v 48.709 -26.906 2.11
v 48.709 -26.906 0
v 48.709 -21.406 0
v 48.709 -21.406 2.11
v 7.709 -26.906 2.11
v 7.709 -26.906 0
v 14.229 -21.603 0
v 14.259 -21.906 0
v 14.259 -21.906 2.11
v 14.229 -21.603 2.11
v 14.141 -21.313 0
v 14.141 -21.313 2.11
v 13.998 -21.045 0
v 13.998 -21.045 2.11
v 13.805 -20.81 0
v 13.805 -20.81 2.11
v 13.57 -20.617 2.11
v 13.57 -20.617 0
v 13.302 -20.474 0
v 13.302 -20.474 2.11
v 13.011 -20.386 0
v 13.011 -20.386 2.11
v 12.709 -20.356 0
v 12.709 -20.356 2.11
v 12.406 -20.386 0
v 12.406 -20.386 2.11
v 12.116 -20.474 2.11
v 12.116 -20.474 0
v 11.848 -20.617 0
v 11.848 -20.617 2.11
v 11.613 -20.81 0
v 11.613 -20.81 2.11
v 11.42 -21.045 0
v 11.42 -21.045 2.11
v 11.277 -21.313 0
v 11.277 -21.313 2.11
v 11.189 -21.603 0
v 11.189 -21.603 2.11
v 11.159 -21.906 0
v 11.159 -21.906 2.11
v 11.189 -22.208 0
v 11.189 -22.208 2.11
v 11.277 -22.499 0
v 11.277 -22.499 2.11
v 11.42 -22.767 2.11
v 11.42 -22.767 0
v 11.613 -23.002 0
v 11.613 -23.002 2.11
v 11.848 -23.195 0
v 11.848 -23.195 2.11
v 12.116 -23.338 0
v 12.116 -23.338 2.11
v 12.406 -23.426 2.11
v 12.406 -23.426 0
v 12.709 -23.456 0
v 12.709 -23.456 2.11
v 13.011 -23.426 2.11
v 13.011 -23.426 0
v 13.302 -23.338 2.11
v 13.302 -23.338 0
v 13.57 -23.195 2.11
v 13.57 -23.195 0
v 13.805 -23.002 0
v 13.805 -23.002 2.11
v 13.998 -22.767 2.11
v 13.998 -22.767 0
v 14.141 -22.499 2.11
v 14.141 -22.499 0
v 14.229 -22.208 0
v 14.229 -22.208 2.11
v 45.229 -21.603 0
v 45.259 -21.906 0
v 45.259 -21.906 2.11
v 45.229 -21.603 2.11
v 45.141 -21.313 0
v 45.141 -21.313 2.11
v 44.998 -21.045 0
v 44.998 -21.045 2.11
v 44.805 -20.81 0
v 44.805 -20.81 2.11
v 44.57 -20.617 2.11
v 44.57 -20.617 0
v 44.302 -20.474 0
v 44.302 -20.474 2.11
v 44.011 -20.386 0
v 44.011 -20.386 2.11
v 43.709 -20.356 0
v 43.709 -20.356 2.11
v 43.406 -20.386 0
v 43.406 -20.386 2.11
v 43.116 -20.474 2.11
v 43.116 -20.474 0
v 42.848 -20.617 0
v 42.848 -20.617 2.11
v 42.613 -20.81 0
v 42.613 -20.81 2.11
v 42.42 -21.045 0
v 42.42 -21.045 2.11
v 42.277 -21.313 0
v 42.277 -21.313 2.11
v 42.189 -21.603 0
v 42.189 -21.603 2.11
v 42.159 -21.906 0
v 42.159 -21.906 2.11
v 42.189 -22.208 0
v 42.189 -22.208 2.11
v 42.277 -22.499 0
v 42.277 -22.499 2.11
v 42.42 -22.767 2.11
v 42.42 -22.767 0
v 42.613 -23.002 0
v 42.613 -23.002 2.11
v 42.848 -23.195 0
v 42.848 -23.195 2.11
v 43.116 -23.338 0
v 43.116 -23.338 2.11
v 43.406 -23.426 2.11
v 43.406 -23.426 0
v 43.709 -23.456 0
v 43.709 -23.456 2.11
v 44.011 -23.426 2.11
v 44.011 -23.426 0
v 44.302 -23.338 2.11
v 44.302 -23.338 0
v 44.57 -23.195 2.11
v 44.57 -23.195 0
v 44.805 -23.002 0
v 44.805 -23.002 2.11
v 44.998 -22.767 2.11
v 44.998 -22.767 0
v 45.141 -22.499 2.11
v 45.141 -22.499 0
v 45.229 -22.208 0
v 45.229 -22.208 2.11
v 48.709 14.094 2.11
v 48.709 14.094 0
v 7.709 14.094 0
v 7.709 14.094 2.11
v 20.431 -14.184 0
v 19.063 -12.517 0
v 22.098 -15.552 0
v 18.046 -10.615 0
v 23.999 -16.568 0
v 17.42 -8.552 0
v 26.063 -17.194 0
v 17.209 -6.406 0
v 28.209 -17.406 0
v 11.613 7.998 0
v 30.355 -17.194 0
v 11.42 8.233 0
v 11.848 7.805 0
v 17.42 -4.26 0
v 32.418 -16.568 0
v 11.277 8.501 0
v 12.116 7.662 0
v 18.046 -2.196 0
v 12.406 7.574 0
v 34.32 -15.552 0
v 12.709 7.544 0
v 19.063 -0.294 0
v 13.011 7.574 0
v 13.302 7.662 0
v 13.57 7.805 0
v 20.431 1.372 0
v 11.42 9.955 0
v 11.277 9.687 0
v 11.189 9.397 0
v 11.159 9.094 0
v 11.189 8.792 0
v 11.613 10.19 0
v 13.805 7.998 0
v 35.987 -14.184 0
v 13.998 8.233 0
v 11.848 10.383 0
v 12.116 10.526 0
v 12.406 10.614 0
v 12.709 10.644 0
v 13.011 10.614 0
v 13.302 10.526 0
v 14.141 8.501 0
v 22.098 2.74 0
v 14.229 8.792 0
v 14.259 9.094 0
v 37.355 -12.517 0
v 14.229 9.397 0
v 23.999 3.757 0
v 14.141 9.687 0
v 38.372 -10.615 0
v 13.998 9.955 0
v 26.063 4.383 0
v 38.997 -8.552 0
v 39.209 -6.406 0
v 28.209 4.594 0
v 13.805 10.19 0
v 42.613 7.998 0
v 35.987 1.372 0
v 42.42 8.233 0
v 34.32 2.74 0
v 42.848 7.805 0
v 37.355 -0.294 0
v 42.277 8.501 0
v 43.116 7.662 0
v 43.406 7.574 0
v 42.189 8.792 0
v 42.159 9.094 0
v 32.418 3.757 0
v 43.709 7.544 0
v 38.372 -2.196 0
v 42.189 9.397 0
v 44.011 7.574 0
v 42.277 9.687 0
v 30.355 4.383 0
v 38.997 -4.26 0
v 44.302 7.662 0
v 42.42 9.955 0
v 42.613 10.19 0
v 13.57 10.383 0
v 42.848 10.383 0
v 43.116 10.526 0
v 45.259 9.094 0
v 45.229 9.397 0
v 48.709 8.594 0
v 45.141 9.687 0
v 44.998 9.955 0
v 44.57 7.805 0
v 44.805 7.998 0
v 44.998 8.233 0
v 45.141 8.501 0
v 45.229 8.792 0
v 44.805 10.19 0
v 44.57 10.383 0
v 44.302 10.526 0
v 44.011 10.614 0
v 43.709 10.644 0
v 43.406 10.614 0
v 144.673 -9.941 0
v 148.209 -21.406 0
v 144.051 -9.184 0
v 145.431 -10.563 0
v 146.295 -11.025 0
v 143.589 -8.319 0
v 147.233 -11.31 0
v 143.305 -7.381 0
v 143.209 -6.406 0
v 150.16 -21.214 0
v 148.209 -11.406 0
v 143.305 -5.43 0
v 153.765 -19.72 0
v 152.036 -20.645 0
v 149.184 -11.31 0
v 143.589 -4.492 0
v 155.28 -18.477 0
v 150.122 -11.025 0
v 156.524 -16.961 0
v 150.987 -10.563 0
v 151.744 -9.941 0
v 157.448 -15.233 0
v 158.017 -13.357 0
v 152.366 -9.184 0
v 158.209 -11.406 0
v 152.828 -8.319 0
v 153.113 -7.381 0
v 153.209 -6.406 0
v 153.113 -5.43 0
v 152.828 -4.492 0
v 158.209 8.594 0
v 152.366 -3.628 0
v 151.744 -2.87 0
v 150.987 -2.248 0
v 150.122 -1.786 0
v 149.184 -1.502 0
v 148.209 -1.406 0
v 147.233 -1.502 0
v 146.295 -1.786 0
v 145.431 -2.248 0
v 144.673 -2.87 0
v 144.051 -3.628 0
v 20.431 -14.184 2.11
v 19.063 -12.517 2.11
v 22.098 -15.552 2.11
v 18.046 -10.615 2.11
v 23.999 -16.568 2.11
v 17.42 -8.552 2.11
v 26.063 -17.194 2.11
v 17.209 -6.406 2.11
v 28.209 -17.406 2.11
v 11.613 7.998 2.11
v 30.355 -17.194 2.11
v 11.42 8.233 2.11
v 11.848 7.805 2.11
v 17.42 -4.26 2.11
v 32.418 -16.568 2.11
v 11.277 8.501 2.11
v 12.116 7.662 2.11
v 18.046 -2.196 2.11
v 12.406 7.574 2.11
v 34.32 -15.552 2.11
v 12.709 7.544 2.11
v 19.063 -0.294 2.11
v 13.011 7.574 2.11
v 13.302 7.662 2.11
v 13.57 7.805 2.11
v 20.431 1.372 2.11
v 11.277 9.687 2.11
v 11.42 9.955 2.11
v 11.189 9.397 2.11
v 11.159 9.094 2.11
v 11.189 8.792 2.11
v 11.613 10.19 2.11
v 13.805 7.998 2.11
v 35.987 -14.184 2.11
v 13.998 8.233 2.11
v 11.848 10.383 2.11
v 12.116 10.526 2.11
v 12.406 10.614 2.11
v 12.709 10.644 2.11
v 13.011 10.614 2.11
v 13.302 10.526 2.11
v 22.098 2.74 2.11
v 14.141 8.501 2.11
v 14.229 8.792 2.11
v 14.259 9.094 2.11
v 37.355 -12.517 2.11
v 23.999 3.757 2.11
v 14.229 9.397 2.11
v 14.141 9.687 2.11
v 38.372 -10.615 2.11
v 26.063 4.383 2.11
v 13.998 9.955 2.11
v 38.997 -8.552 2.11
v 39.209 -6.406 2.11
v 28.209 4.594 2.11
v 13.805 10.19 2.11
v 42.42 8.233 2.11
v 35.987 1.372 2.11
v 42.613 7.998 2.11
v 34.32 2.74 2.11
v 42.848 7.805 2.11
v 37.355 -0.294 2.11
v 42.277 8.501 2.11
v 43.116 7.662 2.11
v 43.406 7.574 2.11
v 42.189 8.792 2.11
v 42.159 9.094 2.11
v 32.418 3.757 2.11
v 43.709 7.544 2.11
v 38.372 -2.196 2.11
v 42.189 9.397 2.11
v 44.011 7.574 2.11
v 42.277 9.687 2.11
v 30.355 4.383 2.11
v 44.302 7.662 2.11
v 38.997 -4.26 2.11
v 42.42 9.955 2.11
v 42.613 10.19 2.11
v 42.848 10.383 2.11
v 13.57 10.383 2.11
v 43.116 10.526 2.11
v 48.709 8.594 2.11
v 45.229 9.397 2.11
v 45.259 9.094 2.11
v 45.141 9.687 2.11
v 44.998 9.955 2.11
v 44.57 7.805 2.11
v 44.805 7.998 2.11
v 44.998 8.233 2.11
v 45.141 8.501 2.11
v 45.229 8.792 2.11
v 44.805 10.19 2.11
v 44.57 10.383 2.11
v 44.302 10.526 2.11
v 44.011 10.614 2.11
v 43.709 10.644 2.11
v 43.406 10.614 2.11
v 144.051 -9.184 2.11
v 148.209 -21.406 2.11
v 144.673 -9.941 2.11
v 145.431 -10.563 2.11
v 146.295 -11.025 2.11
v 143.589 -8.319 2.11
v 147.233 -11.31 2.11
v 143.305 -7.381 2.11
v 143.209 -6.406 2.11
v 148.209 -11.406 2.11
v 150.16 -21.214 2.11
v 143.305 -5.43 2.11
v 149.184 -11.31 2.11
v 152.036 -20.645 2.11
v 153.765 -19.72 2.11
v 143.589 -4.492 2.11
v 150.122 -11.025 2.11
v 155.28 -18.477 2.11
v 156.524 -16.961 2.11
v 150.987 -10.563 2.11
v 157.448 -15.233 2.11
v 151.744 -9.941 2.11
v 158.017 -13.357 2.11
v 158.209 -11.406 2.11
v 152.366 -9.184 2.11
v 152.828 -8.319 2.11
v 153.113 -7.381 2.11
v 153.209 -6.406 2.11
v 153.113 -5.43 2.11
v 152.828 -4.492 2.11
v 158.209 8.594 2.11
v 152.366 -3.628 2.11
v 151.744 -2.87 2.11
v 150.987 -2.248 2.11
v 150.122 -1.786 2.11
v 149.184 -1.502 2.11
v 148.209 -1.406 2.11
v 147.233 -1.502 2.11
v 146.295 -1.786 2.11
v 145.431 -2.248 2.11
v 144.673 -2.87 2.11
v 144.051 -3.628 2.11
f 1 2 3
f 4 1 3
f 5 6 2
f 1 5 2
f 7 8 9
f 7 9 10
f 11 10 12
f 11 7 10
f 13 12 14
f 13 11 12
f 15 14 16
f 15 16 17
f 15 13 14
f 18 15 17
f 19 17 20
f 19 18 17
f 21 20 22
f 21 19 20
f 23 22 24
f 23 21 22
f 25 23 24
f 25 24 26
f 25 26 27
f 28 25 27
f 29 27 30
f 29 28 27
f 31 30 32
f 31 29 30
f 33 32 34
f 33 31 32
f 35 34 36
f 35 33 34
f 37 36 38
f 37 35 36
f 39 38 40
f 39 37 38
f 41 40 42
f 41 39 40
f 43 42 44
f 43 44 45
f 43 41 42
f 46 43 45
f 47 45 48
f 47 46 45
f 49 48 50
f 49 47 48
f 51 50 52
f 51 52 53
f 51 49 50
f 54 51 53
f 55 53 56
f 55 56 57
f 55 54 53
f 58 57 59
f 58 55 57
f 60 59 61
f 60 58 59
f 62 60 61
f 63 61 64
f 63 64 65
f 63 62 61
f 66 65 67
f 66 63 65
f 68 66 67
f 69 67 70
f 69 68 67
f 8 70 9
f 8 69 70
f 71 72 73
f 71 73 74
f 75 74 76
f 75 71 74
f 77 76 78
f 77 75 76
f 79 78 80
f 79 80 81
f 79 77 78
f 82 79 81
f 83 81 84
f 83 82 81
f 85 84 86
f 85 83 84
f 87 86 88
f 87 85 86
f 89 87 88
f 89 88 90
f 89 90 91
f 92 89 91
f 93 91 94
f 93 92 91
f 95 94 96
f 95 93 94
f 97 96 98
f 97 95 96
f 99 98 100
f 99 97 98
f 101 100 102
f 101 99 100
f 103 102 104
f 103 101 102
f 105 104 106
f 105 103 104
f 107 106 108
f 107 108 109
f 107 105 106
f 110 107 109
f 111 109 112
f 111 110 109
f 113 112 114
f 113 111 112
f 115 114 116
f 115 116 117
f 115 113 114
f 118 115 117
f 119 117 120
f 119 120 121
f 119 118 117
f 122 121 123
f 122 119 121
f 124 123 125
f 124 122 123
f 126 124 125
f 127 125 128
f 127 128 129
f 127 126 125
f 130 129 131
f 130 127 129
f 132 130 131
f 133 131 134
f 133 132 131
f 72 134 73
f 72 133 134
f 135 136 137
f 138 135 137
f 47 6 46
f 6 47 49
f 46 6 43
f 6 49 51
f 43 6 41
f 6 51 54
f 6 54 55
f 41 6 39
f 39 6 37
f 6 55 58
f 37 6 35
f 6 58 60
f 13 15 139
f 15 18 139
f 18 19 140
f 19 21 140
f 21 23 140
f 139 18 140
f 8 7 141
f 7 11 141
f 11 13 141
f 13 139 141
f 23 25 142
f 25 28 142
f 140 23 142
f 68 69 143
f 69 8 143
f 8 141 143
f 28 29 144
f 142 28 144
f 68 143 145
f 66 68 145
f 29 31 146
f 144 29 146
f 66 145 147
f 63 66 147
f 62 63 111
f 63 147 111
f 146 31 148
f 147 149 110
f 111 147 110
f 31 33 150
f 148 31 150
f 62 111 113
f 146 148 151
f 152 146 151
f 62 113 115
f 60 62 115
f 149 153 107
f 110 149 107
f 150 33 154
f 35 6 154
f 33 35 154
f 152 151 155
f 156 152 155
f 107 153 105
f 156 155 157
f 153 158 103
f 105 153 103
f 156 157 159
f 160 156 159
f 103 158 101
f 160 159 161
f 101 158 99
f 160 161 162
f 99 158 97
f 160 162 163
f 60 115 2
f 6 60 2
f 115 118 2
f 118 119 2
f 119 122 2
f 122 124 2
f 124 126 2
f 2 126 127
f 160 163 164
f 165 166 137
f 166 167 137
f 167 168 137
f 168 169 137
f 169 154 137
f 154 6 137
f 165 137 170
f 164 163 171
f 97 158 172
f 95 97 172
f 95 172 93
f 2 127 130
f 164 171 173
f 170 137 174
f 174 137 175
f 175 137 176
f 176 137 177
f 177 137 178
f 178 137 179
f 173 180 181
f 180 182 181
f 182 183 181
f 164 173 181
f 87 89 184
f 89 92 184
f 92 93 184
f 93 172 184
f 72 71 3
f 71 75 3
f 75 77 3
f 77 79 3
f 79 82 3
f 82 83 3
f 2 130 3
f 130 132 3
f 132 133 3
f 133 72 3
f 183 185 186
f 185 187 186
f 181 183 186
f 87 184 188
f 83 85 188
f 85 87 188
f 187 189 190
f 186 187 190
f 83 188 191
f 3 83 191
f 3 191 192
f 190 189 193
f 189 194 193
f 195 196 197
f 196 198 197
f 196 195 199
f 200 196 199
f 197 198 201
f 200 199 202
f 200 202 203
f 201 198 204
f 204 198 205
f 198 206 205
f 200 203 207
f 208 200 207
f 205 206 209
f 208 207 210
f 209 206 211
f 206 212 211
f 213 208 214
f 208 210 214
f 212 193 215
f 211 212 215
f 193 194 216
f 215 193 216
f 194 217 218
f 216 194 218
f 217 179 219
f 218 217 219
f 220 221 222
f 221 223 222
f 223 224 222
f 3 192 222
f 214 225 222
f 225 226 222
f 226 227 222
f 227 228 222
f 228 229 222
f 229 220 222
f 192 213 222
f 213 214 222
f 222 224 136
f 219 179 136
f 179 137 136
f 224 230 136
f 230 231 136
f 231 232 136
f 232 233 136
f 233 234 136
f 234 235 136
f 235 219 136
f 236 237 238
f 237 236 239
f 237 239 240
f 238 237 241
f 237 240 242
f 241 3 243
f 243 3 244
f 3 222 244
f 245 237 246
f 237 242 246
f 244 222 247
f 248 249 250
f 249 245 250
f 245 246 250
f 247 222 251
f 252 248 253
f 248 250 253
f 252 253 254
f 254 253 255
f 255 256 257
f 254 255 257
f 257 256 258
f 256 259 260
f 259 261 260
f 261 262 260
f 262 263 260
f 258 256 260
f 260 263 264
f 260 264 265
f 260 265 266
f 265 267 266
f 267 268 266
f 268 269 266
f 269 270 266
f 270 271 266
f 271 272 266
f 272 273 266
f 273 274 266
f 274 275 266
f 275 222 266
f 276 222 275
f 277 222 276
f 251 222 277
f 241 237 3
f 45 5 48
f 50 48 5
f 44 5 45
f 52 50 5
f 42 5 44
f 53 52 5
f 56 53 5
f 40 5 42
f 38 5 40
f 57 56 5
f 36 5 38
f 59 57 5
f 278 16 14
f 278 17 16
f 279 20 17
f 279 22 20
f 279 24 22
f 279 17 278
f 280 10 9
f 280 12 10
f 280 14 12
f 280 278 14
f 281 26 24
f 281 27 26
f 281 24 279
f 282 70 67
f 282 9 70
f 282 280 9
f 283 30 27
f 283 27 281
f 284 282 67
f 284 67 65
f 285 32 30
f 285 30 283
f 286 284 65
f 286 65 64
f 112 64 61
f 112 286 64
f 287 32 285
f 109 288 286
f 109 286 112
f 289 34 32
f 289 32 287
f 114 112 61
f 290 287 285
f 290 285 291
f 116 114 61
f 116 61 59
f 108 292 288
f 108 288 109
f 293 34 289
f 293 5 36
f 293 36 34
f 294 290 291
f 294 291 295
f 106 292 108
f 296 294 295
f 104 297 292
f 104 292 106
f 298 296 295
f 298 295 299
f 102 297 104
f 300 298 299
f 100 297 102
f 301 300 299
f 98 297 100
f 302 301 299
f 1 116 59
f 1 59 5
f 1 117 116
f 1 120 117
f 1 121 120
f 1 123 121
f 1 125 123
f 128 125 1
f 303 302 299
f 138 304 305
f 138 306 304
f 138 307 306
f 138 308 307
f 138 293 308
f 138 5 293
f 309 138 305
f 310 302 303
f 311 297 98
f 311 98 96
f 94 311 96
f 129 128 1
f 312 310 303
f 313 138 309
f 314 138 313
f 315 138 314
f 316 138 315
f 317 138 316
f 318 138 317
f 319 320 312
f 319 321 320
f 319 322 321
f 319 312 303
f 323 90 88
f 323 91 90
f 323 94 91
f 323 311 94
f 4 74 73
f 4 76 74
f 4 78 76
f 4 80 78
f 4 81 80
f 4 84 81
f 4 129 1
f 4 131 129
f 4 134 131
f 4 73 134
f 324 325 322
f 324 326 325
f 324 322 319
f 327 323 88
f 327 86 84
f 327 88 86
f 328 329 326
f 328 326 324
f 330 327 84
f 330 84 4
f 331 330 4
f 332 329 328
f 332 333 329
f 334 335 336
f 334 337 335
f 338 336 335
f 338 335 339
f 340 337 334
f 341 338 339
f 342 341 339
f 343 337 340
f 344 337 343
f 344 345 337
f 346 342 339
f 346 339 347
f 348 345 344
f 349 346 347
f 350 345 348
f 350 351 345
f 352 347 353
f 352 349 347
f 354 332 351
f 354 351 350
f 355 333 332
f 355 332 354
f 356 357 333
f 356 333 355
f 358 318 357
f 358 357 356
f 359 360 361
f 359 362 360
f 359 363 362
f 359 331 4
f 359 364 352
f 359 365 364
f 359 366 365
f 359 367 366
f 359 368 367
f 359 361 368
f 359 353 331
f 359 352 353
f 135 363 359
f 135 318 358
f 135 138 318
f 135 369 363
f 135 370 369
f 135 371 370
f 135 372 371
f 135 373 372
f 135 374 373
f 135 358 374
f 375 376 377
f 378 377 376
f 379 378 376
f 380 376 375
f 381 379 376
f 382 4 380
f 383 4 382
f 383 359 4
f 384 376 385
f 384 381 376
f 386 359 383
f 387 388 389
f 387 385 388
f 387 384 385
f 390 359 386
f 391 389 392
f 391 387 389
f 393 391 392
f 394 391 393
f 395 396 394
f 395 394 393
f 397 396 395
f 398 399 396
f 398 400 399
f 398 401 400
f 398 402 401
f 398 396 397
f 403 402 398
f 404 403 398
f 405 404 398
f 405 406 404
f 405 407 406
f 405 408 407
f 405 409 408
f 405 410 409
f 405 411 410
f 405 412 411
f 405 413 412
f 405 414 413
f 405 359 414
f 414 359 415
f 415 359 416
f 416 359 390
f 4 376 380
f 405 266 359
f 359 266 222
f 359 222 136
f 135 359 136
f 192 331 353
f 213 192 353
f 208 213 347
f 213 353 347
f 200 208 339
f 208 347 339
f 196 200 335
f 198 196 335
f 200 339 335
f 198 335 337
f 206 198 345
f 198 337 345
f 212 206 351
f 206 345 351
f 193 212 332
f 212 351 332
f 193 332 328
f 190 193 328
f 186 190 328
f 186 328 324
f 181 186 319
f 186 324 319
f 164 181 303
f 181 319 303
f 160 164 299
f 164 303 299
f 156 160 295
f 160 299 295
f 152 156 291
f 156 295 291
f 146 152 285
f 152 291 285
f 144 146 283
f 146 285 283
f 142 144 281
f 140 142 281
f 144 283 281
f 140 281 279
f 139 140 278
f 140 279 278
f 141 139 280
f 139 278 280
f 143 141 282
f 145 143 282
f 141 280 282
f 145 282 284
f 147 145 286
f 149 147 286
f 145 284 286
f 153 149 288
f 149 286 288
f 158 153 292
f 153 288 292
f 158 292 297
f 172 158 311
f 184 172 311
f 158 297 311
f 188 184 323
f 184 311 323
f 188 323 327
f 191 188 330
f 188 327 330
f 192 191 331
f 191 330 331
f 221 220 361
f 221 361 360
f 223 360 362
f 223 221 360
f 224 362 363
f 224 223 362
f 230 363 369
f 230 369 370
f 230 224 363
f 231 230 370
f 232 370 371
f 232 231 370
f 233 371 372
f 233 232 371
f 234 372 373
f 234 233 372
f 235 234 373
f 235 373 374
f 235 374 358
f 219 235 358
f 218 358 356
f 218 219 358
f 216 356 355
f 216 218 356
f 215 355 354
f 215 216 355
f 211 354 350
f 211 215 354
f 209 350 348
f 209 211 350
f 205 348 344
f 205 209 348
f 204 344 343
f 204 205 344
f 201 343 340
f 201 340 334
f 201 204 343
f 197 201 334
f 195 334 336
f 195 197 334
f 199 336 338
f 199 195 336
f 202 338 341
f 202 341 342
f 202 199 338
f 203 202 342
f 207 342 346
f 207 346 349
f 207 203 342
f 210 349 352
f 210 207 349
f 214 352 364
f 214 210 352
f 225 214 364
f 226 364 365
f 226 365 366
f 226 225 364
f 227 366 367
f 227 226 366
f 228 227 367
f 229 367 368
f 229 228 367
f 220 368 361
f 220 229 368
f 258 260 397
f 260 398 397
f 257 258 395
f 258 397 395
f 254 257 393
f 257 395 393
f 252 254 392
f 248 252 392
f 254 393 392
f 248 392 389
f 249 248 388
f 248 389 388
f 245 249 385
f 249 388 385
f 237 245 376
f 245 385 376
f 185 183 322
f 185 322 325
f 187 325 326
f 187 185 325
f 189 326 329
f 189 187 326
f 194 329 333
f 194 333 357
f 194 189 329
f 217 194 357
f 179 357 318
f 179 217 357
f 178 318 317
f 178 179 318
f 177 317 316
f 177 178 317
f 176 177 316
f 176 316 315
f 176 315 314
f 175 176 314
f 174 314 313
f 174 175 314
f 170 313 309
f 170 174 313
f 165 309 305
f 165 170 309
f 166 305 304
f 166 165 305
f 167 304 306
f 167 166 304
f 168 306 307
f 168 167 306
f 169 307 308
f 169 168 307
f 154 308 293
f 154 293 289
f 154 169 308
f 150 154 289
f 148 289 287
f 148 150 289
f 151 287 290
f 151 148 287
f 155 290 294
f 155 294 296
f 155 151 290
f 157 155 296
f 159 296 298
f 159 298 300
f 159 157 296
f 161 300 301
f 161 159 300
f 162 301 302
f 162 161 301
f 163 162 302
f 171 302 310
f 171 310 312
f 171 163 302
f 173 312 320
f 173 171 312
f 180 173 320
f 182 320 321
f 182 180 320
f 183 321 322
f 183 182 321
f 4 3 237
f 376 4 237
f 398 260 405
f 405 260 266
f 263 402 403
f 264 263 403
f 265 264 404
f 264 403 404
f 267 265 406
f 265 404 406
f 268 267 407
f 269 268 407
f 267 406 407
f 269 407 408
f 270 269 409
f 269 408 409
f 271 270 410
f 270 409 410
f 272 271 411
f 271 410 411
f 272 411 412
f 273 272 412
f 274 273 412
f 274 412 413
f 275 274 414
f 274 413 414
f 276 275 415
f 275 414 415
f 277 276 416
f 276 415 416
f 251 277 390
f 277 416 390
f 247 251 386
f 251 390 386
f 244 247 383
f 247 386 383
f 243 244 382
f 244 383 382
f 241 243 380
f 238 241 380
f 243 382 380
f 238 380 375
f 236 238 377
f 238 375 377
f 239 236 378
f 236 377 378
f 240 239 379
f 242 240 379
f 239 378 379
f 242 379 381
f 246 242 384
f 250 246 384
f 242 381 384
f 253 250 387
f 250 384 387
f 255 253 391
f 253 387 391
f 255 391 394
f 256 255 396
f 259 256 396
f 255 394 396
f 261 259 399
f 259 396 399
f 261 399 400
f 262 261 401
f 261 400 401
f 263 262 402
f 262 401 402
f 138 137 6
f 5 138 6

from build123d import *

# Parameters (mm, degrees)
CROQUIS1_R              = 1.55
SALIENTE_EXTRUIR1_DEPTH = 2.11
CROQUIS5_R              = 11
CORTAR_EXTRUIR1_DEPTH   = 2.11
CROQUIS6_R              = 5
CORTAR_EXTRUIR2_DEPTH   = 2.11
REDONDEO1_R             = 10


with BuildPart() as part:
    # Croquis1 → Saliente-Extruir1 (new body)
    with BuildSketch(Plane.XY):
        Polygon((158.208826457, -21.405767977), (158.208826457, 8.594232023), (48.708826457, 8.594232023), (48.708826457, 14.094232023), (7.708826457, 14.094232023), (7.708826457, -26.905767977), (48.708826457, -26.905767977), (48.708826457, -21.405767977), align=None)
        with Locations((12.708826457, -21.905767977)):
            Circle(CROQUIS1_R, mode=Mode.SUBTRACT)
        with Locations((12.708826457, 9.094232023)):
            Circle(CROQUIS1_R, mode=Mode.SUBTRACT)
        with Locations((43.708826457, 9.094232023)):
            Circle(CROQUIS1_R, mode=Mode.SUBTRACT)
        with Locations((43.708826457, -21.905767977)):
            Circle(CROQUIS1_R, mode=Mode.SUBTRACT)
    extrude(amount=SALIENTE_EXTRUIR1_DEPTH)

    # Croquis5 → Cortar-Extruir1 (cut)
    with BuildSketch(Plane.XY.offset(2.11)):
        with Locations((28.208826457, -6.405767977)):
            Circle(CROQUIS5_R)
    extrude(amount=-CORTAR_EXTRUIR1_DEPTH, mode=Mode.SUBTRACT)

    # Croquis6 → Cortar-Extruir2 (cut)
    with BuildSketch(Plane.XY.offset(2.11)):
        with Locations((148.208826457, -6.405767977)):
            Circle(CROQUIS6_R)
    extrude(amount=-CORTAR_EXTRUIR2_DEPTH, mode=Mode.SUBTRACT)

    # Redondeo1
    redondeo1_edges = [part.edges().sort_by_distance(p)[0] for p in [
        (158.208826457, -21.405767977, 1.055),
    ]]
    fillet(redondeo1_edges, radius=REDONDEO1_R)


solid = part.part
